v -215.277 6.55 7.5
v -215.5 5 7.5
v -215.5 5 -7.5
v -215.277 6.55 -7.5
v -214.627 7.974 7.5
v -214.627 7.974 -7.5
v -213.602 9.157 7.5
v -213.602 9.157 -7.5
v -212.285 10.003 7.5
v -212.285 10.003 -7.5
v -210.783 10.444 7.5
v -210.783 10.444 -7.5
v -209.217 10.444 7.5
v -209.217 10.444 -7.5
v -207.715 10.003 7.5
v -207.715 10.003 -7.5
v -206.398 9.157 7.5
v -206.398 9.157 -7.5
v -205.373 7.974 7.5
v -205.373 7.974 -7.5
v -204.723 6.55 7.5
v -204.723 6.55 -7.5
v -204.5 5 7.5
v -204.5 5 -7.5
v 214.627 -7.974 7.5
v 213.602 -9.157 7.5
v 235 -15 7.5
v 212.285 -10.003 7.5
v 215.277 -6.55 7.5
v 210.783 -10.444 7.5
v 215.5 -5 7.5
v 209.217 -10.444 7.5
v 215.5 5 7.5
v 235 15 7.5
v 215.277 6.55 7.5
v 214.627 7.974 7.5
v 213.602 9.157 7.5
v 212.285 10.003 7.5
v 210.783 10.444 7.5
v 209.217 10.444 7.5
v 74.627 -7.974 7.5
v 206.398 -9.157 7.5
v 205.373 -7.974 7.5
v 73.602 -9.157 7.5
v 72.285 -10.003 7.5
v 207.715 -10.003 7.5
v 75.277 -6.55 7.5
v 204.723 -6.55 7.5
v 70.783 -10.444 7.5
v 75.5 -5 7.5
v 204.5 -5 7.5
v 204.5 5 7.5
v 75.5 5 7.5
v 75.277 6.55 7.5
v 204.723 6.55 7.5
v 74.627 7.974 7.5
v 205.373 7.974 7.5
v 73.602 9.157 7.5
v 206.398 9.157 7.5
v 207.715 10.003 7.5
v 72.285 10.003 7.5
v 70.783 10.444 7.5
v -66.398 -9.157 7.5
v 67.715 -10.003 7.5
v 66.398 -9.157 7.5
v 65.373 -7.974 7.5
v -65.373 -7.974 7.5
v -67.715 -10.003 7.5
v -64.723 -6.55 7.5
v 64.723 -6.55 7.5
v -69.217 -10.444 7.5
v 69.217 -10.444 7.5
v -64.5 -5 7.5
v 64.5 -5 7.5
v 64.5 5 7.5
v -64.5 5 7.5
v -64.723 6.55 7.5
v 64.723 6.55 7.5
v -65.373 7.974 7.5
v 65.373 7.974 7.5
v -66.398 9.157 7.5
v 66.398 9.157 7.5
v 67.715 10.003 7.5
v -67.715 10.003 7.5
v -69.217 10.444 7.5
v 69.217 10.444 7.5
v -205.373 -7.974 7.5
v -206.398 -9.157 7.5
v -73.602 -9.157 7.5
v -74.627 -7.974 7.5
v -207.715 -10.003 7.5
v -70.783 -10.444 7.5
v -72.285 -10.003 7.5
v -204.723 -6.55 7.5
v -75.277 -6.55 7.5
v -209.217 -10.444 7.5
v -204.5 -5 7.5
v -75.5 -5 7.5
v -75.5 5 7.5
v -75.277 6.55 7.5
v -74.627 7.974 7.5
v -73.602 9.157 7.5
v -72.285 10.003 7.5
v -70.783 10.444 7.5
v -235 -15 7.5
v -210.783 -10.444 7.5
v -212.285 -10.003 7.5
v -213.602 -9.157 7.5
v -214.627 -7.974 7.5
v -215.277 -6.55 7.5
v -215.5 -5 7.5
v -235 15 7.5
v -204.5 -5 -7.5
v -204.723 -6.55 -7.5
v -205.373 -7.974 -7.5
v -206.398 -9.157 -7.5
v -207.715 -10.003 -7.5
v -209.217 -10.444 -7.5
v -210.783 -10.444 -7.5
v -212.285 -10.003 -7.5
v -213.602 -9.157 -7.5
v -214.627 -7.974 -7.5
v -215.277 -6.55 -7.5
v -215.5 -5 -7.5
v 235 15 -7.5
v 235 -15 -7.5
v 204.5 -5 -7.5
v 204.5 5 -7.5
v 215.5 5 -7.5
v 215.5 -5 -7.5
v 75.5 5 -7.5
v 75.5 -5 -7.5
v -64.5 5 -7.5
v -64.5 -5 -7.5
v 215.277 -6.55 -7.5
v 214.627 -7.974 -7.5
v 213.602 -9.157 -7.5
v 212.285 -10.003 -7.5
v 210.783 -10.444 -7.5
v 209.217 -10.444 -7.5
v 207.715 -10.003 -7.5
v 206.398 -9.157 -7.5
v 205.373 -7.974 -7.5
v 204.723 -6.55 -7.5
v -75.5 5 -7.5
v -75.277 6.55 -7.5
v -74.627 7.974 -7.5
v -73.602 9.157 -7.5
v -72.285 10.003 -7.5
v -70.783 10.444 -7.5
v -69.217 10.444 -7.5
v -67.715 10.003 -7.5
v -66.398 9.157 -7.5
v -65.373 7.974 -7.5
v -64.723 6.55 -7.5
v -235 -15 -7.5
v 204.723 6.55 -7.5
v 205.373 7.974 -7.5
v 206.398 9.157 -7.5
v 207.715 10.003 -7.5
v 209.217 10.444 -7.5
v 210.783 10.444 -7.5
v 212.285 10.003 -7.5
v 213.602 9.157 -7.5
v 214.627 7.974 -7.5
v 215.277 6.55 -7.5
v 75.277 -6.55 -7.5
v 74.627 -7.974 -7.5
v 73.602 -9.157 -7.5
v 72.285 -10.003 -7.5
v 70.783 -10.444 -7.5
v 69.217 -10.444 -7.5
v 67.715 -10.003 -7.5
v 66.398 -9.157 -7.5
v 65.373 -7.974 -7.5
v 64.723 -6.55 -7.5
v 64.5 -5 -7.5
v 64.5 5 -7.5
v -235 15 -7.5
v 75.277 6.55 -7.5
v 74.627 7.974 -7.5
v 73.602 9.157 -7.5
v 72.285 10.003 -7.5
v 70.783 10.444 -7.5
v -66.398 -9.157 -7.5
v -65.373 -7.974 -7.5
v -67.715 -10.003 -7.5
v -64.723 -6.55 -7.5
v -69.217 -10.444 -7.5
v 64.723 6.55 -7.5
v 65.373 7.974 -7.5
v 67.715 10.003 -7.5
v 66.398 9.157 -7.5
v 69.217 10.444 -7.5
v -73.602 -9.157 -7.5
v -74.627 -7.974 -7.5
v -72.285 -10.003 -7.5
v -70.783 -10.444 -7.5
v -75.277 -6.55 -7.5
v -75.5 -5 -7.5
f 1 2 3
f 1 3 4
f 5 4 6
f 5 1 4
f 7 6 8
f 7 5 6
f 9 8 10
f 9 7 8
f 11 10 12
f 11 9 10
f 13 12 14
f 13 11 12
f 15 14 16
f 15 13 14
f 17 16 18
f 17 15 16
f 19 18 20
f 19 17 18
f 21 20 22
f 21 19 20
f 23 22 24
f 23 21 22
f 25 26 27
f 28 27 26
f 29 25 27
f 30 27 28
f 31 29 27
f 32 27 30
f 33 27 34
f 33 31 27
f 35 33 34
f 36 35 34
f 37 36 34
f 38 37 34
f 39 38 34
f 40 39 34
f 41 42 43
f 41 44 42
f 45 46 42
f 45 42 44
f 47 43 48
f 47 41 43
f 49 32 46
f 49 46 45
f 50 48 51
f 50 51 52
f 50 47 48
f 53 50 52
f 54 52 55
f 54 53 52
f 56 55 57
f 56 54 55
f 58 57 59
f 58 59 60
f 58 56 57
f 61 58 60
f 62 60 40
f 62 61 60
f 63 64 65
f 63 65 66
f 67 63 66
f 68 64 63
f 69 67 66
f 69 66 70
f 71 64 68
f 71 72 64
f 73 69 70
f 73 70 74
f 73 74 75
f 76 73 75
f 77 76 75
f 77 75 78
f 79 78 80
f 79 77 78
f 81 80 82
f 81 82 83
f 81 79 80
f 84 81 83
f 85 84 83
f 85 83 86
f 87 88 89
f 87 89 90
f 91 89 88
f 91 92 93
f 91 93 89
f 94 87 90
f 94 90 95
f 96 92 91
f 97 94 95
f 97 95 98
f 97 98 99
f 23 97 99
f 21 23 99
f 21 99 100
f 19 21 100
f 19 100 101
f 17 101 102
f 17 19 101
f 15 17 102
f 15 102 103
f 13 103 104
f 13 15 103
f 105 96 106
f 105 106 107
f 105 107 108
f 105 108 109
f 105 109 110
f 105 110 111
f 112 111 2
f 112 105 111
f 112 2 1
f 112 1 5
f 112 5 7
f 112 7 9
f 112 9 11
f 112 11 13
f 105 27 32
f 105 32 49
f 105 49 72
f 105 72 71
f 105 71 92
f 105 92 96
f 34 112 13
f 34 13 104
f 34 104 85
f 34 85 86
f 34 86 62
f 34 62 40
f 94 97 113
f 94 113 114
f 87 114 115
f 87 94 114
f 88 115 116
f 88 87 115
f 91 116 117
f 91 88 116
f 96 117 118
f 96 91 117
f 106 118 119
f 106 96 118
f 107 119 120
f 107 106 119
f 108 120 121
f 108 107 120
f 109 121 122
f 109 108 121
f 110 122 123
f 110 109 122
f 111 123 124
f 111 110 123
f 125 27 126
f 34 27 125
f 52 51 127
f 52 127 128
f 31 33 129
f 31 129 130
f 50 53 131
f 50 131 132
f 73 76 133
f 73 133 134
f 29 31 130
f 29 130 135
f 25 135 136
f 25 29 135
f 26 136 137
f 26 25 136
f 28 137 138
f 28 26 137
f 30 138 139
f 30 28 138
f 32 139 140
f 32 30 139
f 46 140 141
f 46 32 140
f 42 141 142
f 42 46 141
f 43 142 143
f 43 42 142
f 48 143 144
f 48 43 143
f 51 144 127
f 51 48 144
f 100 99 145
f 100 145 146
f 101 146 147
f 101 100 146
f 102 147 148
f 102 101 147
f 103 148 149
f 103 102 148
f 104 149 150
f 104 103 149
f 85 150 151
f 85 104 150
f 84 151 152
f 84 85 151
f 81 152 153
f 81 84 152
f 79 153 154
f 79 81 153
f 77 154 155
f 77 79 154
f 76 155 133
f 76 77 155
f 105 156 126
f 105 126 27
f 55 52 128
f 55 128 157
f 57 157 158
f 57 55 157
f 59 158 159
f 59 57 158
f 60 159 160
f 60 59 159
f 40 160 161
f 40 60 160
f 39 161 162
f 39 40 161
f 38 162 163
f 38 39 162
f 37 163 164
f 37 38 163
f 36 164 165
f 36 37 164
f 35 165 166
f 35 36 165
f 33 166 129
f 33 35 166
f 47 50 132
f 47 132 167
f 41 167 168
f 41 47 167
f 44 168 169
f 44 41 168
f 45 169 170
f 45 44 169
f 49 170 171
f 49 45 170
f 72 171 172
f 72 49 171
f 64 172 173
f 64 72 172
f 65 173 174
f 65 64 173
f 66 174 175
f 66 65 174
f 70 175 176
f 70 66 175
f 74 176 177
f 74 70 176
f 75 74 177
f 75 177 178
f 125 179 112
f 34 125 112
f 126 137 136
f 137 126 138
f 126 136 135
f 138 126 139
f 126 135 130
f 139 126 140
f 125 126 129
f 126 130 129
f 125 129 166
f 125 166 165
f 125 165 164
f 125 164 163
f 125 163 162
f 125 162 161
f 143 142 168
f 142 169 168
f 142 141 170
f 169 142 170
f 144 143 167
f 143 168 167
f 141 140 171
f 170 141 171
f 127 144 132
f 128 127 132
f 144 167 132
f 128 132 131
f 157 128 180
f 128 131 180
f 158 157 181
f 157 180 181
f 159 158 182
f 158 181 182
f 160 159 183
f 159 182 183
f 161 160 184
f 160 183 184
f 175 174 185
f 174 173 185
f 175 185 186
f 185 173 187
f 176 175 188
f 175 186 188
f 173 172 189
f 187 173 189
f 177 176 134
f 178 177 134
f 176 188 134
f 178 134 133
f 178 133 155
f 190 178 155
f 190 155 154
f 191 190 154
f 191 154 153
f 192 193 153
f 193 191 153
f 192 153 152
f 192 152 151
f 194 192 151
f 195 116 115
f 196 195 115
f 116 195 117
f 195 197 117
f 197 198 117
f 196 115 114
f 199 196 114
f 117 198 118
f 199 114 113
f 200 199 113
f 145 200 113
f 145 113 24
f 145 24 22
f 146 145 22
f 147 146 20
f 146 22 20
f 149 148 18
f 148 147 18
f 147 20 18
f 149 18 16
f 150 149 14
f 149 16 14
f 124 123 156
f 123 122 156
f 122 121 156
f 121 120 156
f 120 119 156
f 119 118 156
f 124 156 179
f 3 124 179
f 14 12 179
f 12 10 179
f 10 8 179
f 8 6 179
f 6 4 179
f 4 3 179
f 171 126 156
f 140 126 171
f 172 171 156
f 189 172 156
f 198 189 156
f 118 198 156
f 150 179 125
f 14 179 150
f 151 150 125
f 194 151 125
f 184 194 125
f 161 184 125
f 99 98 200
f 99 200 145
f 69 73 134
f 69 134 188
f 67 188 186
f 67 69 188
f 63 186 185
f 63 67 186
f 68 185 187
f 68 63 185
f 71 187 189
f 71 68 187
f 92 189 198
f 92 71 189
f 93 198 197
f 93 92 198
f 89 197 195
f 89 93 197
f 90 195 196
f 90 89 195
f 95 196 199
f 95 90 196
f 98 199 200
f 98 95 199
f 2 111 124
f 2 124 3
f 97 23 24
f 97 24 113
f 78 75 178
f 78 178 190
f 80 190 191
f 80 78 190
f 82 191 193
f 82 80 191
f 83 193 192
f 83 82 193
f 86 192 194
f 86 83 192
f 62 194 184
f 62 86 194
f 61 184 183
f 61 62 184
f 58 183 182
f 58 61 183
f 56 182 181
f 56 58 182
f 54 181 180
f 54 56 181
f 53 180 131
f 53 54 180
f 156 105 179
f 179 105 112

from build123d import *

# Parameters (mm, degrees)
PLAT_W                      = 30
PLAT_H                      = 15
EL_MENT_M_CANO_SOUD_1_DEPTH = 470
ENL_V_MAT_EXTRU_2_DEPTH     = 20
R_P_TITION_LIN_AIRE1_COUNT  = 4
R_P_TITION_LIN_AIRE1_PITCH  = 140


with BuildPart() as part:
    # plat → Elément mécano-soudé1 (new body)
    with BuildSketch(Plane.YZ.offset(-235)):
        Rectangle(PLAT_W, PLAT_H)
    extrude(amount=EL_MENT_M_CANO_SOUD_1_DEPTH)

    # Esquisse7 → Enlèv. mat.-Extru.2 (cut)
    with BuildSketch(Plane.XY.offset(7.5)):
        with BuildLine():
            Line((-215.5, -5), (-215.5, 5))
            ThreePointArc((-215.5, 5), (-210, 10.5), (-204.5, 5))
            Line((-204.5, 5), (-204.5, -5))
            ThreePointArc((-204.5, -5), (-210, -10.5), (-215.5, -5))
        make_face()
    enl_v_mat_extru_2 = extrude(amount=-ENL_V_MAT_EXTRU_2_DEPTH, mode=Mode.SUBTRACT)

    # Répétition linéaire1: Enlèv. mat.-Extru.2 ×4
    with Locations(*[(i * R_P_TITION_LIN_AIRE1_PITCH, 0, 0) for i in range(1, R_P_TITION_LIN_AIRE1_COUNT)]):
        add(enl_v_mat_extru_2, mode=Mode.SUBTRACT)


solid = part.part
